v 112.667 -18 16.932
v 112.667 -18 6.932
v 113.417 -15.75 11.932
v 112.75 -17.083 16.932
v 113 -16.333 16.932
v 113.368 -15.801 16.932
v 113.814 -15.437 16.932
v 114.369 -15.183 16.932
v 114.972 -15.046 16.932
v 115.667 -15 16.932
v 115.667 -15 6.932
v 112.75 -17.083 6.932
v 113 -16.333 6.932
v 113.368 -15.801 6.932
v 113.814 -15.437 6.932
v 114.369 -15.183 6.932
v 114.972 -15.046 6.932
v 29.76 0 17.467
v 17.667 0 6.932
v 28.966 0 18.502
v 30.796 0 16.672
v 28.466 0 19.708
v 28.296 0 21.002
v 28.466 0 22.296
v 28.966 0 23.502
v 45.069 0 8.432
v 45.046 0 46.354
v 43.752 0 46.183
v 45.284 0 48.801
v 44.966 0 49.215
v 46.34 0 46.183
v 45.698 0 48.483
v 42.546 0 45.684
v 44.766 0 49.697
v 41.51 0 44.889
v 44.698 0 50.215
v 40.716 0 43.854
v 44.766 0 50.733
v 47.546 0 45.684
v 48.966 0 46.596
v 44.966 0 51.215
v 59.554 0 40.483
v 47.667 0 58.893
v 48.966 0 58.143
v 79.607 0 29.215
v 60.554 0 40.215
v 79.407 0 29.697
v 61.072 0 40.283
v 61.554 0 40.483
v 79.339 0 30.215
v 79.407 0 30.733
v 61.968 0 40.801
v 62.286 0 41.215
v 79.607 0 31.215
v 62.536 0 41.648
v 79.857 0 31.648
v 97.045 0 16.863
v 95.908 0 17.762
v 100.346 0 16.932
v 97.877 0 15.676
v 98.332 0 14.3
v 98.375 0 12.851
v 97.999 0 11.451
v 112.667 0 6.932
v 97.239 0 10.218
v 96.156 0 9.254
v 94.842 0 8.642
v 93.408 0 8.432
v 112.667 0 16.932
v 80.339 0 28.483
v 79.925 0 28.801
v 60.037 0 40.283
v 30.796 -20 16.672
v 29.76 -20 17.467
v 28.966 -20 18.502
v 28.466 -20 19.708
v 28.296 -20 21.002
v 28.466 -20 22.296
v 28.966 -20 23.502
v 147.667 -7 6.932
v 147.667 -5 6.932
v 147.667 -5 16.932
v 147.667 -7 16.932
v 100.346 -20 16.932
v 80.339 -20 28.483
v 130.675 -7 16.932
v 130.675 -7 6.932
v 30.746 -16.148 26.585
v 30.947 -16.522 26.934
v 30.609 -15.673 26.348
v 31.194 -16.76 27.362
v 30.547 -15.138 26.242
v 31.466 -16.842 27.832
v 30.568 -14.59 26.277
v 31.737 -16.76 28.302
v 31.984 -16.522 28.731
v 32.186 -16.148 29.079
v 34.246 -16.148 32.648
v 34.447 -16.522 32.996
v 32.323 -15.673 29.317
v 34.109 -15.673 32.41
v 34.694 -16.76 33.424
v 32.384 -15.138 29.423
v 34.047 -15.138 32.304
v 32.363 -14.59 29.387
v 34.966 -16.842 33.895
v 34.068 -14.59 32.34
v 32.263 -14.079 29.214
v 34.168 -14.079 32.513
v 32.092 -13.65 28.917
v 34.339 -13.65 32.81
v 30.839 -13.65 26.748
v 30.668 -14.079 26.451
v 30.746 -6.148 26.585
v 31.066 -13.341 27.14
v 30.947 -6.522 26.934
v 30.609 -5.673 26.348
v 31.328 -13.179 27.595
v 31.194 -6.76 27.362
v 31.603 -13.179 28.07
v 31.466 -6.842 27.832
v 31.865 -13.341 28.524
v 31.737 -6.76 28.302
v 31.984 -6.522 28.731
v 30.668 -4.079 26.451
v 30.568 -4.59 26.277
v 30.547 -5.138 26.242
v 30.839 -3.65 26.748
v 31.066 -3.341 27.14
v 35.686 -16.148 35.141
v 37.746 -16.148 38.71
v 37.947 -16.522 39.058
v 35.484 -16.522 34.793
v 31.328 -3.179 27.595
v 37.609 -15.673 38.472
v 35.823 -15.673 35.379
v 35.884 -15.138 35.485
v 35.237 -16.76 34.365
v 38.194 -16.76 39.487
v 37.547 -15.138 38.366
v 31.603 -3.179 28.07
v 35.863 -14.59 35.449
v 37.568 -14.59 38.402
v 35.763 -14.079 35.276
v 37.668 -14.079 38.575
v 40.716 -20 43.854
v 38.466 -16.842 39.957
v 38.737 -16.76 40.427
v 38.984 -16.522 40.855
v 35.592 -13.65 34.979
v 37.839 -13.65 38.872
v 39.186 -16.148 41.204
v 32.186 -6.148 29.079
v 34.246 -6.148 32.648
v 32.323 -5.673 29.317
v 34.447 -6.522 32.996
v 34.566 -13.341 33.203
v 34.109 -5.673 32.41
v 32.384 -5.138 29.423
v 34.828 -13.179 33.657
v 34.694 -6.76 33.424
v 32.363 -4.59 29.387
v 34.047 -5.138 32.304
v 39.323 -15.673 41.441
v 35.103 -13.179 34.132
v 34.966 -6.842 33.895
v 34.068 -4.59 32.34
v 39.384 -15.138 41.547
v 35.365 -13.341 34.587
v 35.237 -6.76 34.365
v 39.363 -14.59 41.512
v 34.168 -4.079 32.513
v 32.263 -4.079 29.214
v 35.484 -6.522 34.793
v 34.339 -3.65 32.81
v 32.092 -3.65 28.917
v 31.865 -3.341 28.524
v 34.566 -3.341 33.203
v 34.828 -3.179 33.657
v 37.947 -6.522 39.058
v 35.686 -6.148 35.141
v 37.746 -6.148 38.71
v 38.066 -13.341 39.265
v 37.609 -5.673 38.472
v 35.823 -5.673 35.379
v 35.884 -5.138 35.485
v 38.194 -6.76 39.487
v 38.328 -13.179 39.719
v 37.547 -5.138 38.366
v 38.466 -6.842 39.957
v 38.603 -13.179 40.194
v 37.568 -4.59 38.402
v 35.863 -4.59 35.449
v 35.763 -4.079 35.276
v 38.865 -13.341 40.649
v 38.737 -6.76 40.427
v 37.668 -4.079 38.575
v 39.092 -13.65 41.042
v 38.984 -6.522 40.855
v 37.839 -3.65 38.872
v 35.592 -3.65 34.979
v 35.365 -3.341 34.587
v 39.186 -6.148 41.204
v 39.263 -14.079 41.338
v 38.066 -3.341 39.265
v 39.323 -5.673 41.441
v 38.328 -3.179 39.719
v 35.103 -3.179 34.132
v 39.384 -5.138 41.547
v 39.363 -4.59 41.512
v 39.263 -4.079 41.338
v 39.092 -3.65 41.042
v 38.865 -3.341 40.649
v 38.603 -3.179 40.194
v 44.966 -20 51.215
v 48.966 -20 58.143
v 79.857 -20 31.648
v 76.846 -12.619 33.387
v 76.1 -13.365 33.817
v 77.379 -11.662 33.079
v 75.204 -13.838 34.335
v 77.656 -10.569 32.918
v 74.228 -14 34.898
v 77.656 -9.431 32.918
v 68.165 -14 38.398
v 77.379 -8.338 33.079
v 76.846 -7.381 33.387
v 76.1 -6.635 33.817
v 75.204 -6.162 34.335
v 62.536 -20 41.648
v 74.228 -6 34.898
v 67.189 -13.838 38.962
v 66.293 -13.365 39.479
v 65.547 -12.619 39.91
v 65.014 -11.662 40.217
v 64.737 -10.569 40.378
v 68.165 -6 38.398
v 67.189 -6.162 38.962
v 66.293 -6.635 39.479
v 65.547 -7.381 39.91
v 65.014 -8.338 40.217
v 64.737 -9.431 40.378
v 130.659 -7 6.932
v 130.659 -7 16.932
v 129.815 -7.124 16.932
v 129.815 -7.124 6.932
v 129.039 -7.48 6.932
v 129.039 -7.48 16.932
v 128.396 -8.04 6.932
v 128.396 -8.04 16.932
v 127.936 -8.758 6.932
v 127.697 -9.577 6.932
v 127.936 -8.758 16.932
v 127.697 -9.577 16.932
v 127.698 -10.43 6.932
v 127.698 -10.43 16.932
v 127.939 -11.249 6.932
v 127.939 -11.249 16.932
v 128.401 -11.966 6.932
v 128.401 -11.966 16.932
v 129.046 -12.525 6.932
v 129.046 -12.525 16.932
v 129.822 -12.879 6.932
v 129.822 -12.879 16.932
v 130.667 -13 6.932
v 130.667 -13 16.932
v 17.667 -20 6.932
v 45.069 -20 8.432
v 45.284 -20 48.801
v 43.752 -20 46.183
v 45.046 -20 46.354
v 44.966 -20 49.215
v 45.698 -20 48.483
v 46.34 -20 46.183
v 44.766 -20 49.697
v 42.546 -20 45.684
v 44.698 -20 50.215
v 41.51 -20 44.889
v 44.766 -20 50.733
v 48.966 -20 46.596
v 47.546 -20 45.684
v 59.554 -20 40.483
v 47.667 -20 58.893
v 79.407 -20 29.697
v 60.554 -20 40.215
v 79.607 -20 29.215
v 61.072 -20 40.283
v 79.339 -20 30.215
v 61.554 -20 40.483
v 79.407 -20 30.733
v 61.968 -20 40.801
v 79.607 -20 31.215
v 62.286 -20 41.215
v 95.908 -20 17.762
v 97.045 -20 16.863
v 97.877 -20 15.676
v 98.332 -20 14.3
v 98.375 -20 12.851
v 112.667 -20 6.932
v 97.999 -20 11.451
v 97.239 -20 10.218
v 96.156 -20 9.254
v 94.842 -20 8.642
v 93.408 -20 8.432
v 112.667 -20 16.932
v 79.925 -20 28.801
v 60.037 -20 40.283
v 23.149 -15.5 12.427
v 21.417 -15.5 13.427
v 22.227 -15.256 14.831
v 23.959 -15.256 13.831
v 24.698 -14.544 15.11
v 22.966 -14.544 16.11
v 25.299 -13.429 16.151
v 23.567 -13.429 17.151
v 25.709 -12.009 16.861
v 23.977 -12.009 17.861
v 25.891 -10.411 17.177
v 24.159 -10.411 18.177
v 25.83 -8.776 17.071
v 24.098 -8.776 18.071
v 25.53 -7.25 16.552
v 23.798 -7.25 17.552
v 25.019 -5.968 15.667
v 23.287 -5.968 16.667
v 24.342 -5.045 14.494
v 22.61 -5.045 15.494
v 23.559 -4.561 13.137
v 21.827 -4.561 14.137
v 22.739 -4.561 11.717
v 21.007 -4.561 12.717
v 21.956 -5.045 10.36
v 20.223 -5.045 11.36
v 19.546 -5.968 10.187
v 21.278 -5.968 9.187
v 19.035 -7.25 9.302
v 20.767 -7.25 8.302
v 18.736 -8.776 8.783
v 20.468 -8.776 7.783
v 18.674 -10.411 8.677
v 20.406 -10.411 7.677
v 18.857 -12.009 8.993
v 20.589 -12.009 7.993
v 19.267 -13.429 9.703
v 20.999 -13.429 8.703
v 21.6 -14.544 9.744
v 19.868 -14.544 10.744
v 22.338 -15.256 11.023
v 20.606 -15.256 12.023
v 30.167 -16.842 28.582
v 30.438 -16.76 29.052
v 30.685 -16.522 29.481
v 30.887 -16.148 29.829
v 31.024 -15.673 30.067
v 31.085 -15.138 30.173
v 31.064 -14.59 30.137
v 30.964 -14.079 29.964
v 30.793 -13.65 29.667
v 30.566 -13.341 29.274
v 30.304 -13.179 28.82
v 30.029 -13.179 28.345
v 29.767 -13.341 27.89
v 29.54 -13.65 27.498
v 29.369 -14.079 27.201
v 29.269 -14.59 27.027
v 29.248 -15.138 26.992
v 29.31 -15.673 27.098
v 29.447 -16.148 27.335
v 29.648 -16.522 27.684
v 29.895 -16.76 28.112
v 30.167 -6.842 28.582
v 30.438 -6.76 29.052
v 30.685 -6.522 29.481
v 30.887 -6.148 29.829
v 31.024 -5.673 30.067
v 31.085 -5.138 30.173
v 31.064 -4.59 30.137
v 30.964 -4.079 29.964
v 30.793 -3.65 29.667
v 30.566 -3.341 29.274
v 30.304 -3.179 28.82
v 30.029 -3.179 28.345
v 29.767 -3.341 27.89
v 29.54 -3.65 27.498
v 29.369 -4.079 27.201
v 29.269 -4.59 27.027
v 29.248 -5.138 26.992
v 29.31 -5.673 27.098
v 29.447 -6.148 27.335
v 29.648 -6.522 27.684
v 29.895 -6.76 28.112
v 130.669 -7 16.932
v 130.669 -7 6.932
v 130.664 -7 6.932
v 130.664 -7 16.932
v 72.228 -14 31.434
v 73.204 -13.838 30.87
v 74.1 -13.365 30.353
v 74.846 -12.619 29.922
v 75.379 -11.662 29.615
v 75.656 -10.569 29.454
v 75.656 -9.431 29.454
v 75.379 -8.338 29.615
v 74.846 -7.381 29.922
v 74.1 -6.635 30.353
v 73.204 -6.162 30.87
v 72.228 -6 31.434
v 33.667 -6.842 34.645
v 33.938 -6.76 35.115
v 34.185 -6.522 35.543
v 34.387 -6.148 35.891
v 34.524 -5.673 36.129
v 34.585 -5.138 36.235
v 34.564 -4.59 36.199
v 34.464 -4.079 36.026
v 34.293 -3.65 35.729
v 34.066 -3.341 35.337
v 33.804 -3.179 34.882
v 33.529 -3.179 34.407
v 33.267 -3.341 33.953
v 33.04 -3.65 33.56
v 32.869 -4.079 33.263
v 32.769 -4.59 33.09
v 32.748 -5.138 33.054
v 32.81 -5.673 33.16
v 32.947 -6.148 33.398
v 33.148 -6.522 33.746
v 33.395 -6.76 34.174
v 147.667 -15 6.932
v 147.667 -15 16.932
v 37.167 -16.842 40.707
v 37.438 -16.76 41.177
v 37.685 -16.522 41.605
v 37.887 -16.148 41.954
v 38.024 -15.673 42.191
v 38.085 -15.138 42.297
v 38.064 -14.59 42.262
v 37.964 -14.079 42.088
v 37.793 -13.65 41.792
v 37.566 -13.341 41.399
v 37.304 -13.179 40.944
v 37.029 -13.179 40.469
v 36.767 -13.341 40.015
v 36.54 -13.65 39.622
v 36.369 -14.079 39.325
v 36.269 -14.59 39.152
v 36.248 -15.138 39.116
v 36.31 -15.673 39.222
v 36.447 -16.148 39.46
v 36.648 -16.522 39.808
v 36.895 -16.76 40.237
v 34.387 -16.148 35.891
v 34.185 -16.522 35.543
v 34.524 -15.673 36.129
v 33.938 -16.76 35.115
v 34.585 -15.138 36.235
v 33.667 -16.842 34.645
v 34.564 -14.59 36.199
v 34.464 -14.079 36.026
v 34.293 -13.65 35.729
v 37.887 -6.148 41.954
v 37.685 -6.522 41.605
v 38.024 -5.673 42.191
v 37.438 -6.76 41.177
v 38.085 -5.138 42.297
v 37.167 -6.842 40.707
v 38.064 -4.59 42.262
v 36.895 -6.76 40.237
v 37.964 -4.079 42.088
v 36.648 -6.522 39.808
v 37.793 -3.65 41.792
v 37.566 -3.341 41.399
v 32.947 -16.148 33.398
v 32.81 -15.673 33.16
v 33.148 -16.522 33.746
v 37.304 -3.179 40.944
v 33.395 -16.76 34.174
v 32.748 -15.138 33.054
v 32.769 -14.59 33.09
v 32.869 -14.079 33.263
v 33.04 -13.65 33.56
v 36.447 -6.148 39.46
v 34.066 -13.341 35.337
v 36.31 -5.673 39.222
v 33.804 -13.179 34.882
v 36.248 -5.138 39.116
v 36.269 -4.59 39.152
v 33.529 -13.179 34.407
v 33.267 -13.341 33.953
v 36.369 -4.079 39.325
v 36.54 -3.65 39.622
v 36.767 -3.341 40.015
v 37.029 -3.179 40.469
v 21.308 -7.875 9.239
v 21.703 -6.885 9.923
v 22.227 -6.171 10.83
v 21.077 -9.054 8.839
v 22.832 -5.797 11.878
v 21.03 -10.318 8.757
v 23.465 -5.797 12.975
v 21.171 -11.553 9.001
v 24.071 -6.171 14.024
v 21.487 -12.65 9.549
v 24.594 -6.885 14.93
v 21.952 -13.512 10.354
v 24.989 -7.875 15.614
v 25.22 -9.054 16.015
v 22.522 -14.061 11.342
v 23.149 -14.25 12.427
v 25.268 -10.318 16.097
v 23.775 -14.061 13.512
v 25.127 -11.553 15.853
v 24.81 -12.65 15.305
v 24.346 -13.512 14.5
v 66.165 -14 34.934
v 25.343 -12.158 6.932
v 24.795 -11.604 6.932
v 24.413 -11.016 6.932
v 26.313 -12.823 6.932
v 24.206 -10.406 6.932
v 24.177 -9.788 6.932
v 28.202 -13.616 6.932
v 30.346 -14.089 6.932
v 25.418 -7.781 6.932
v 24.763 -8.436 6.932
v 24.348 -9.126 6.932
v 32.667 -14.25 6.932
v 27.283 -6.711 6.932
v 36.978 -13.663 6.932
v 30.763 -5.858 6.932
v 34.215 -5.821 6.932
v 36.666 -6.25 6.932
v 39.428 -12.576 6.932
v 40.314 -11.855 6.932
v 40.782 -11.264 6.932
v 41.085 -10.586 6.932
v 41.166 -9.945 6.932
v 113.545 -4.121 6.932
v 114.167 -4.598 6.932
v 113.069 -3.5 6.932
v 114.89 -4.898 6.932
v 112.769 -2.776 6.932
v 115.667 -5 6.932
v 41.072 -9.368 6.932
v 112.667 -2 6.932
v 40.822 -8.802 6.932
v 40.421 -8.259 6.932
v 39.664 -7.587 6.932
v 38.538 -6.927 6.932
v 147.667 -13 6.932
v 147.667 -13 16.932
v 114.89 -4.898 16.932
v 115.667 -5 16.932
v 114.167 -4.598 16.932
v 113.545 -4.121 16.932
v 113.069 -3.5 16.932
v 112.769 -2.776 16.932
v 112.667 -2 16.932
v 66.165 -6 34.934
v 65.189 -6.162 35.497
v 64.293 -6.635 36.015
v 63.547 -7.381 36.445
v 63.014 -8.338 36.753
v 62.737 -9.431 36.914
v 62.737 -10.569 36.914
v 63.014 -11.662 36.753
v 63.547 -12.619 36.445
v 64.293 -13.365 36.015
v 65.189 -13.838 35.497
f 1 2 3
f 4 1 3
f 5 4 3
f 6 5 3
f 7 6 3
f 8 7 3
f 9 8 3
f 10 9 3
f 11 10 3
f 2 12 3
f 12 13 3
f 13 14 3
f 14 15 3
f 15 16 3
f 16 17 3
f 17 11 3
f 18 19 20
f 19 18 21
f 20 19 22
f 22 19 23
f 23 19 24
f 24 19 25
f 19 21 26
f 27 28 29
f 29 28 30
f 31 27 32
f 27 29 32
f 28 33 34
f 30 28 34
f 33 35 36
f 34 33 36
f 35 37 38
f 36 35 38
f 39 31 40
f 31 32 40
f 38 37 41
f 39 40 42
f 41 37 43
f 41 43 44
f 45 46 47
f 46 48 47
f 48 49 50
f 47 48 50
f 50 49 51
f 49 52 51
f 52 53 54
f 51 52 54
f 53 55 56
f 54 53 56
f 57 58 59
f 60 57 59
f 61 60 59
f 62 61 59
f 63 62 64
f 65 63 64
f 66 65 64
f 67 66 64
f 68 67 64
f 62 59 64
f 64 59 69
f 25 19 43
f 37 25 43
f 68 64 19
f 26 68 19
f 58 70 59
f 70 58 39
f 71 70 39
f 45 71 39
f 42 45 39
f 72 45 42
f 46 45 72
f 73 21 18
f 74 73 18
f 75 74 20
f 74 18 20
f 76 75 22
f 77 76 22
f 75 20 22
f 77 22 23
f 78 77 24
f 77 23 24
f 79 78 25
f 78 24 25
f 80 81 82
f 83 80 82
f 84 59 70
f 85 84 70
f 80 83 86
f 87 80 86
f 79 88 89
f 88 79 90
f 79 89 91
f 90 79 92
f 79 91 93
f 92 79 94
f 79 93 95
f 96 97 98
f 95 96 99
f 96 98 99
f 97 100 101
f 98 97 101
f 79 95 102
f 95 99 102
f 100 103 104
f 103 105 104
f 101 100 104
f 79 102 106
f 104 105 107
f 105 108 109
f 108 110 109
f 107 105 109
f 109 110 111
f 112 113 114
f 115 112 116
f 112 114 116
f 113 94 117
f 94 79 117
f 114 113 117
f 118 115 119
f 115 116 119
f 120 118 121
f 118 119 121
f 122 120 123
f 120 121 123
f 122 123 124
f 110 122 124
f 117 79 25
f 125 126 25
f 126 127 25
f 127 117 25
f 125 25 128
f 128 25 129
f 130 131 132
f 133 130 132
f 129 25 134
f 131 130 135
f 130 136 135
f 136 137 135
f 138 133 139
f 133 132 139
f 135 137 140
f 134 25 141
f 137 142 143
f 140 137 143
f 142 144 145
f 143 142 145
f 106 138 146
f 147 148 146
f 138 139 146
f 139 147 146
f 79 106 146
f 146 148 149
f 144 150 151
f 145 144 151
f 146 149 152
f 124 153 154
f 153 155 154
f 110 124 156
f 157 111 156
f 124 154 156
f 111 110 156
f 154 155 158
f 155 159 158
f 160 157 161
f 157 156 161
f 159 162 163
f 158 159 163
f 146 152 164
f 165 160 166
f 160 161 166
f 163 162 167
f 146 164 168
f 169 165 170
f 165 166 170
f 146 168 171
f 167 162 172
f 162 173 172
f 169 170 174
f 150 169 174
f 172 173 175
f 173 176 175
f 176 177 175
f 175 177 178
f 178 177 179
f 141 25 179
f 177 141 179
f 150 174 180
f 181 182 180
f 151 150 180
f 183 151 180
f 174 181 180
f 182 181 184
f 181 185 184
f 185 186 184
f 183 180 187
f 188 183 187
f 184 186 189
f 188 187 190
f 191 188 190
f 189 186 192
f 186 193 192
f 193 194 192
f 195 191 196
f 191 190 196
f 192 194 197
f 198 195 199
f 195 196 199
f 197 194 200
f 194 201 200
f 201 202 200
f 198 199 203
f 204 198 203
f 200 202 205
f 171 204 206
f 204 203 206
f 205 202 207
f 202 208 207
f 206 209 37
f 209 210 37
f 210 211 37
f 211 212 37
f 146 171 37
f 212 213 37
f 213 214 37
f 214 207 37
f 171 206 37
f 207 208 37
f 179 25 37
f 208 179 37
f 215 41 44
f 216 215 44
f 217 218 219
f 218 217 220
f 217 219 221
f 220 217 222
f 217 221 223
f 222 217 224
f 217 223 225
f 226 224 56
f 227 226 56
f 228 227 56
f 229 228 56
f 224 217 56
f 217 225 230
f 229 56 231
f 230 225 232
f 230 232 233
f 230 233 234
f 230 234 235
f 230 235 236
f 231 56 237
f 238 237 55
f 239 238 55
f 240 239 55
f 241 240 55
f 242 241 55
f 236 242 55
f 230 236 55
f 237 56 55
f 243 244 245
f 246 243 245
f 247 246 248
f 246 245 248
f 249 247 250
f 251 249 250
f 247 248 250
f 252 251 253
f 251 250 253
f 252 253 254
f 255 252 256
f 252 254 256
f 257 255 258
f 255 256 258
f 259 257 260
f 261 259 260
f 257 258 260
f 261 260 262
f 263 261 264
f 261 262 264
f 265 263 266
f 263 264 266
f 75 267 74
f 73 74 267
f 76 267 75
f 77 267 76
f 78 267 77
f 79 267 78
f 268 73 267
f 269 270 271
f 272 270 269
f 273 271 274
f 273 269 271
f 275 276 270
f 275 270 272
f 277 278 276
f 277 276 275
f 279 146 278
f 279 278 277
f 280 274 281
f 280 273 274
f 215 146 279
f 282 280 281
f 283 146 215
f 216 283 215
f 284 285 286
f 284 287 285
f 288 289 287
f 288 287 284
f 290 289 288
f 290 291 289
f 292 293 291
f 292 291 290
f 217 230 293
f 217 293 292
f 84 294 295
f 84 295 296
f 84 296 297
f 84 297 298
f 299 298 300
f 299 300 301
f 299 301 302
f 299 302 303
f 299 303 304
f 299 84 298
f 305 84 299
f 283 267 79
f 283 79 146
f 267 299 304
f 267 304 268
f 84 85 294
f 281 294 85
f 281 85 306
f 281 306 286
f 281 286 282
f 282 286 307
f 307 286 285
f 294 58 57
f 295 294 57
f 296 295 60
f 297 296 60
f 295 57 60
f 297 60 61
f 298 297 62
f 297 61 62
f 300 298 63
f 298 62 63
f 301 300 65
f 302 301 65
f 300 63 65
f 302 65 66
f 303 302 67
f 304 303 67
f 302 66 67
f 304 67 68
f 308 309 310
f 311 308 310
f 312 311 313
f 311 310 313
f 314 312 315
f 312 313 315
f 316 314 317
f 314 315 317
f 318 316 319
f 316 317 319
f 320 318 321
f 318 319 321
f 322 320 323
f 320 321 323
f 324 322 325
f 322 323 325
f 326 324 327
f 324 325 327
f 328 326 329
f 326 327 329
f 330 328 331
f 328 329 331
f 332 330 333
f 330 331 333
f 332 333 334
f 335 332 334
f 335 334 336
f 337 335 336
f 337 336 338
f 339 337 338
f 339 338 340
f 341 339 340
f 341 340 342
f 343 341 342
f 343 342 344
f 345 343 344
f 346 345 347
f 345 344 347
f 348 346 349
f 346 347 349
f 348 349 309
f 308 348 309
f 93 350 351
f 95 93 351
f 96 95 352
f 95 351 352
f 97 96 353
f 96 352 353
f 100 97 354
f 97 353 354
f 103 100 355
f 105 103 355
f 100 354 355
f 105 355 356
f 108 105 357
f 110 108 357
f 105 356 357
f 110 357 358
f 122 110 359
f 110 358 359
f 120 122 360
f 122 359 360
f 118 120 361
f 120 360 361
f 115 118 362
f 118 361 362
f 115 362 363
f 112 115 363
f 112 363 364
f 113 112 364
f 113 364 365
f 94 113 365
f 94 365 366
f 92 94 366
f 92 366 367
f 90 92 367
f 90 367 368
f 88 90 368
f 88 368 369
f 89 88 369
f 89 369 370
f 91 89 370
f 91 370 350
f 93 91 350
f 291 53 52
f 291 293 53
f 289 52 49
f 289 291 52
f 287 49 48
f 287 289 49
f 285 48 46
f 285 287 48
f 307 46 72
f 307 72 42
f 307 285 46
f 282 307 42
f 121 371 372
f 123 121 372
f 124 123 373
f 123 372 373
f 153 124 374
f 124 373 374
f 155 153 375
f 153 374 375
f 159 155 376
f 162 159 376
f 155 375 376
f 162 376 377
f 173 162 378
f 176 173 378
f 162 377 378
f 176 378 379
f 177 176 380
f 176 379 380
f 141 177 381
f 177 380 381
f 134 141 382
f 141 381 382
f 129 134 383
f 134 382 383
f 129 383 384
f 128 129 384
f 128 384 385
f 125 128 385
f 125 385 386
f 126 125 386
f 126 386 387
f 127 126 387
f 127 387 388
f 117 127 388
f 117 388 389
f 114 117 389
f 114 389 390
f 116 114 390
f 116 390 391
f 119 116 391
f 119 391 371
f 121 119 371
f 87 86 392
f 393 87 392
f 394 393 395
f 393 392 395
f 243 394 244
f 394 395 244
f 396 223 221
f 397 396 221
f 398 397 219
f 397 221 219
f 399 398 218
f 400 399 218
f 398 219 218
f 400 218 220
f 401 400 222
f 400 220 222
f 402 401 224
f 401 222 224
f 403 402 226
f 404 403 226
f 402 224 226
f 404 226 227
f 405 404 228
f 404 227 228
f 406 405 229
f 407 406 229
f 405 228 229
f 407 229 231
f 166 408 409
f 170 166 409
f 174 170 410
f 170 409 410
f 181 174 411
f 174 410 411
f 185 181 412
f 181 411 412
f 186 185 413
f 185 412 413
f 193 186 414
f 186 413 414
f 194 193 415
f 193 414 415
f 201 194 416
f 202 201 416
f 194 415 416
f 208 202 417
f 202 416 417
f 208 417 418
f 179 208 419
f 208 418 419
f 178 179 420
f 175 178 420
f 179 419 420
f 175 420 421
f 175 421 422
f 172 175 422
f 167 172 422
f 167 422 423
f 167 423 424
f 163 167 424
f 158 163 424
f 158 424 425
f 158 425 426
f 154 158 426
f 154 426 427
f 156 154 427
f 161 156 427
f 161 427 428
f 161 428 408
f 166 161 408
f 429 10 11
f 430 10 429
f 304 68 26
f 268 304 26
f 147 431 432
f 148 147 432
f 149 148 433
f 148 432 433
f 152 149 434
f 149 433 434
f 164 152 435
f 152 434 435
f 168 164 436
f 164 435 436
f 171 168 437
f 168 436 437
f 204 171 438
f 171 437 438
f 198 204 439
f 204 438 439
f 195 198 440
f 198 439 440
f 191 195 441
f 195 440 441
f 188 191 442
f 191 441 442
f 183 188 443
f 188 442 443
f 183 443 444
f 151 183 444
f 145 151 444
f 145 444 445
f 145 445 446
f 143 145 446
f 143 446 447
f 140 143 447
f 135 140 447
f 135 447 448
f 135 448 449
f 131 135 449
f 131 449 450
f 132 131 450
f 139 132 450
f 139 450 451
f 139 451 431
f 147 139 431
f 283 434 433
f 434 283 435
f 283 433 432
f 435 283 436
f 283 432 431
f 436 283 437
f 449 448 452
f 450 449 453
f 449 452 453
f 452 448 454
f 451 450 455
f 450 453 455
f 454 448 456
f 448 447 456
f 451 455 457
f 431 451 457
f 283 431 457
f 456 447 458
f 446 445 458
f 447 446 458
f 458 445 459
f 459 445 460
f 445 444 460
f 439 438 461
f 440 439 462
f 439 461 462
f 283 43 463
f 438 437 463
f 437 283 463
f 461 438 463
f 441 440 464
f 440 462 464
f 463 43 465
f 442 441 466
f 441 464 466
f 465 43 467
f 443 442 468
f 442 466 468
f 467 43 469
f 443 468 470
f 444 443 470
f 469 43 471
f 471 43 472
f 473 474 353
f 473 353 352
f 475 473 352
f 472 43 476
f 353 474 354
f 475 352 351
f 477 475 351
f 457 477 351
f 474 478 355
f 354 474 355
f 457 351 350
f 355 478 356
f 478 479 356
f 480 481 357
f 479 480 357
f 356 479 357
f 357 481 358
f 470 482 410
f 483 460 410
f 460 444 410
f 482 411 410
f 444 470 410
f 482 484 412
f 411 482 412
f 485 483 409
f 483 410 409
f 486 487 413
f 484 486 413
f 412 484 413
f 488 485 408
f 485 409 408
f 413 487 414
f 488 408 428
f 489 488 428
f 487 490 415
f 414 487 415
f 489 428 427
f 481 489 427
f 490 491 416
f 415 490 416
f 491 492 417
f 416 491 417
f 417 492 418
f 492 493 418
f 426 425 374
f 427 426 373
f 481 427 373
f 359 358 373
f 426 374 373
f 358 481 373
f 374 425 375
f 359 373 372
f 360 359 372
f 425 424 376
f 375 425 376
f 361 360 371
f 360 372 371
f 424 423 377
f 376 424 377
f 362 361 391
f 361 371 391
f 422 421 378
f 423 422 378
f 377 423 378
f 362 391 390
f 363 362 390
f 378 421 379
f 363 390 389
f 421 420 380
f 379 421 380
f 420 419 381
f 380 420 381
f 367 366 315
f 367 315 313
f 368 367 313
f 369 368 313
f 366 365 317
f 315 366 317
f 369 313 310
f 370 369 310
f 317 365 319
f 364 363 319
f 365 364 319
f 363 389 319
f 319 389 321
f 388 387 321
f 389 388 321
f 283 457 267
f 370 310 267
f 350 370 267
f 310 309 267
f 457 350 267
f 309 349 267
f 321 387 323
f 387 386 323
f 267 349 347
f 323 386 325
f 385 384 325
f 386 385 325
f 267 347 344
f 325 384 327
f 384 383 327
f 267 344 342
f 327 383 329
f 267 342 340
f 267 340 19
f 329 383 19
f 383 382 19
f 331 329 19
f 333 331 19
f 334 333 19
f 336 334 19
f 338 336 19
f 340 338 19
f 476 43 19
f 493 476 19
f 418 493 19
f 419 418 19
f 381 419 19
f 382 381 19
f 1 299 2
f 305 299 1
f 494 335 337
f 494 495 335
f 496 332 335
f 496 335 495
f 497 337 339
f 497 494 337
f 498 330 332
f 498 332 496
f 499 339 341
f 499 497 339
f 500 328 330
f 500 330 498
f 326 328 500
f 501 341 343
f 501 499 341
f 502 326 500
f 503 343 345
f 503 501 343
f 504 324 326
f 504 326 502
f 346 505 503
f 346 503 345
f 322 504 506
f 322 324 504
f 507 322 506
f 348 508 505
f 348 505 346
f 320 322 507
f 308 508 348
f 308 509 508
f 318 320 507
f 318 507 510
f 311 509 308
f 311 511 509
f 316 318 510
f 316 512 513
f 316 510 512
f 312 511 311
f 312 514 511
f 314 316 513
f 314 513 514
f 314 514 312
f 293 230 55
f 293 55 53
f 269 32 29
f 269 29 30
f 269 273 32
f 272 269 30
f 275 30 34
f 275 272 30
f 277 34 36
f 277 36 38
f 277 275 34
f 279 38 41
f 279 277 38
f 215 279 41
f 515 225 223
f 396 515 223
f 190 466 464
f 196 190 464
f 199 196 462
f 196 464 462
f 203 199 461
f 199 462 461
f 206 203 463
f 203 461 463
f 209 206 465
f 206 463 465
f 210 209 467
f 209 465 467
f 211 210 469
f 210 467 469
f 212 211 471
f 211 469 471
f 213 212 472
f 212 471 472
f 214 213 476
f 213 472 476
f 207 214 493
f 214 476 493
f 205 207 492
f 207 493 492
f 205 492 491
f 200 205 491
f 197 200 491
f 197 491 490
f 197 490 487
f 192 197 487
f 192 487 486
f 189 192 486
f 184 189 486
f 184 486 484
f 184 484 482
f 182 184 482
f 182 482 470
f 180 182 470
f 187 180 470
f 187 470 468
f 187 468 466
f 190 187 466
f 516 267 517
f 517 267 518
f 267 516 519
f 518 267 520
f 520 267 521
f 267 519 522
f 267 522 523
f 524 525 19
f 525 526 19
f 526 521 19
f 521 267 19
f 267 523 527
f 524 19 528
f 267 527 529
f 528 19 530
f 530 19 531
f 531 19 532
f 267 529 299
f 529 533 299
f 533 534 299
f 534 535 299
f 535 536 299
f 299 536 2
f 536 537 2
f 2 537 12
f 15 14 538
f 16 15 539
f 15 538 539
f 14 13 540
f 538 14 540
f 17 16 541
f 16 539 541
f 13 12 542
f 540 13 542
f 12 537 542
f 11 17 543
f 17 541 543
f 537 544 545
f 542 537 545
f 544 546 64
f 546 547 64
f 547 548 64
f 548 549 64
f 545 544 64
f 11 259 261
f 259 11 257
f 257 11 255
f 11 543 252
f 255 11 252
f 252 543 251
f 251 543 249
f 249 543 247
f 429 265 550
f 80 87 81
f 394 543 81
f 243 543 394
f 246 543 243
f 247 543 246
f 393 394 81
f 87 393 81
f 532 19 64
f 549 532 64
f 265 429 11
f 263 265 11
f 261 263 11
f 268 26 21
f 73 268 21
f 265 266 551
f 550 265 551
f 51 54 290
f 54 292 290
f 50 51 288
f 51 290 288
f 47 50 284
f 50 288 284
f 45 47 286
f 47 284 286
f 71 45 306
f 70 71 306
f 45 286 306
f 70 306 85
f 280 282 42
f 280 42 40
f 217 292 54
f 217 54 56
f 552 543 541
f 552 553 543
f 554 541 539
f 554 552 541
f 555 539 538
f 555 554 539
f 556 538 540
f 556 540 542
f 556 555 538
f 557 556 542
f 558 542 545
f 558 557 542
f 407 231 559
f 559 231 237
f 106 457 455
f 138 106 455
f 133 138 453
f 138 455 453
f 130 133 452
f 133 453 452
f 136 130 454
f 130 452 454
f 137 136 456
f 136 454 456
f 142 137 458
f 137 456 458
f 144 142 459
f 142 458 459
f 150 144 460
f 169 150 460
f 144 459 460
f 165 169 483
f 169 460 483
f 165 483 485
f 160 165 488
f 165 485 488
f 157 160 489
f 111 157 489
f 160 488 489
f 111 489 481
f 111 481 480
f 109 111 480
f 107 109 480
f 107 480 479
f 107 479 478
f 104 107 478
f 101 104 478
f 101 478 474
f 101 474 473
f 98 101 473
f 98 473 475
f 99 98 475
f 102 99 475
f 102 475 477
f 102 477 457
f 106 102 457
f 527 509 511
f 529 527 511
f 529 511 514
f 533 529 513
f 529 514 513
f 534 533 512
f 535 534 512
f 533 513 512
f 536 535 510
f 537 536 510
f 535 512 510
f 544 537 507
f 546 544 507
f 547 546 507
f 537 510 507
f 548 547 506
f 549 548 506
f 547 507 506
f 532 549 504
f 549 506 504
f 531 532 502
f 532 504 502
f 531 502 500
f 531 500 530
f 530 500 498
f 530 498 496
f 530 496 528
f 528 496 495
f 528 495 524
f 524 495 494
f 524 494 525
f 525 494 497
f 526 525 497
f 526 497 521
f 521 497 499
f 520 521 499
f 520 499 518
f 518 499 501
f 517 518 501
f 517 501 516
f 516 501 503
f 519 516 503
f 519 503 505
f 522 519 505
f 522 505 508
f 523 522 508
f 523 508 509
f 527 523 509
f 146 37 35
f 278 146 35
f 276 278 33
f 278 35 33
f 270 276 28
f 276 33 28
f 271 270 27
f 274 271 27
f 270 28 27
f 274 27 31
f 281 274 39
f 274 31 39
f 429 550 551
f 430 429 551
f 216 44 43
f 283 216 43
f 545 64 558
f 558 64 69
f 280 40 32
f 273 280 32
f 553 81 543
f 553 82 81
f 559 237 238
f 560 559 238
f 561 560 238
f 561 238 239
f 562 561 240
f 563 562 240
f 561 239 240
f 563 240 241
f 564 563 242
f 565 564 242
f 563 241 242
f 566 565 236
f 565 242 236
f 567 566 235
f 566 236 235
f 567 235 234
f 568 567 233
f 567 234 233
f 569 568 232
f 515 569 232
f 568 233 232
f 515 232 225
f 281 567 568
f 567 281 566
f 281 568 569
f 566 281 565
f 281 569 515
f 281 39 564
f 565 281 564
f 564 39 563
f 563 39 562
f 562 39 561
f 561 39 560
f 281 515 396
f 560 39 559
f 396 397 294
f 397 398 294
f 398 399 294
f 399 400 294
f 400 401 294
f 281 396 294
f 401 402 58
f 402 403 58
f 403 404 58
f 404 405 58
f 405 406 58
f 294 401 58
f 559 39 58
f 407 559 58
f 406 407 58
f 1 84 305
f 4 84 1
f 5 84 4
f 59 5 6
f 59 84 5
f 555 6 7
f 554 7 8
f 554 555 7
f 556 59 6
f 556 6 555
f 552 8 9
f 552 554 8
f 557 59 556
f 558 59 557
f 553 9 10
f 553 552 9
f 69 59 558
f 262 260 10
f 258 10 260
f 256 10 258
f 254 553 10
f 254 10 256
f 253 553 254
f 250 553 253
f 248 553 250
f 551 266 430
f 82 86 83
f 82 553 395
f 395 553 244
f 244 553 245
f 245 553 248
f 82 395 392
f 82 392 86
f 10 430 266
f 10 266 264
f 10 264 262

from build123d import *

# Parameters (mm, degrees)
F1_DEPTH    = 20
F2_W        = 35
F2_H        = 10
F3_DEPTH    = 5
F4_W        = 35
F4_H        = 10
F5_DEPTH    = 5
F7_DEPTH    = 25
F8_T1_DEPTH = 10
F9_R        = 3
F10_R       = 2
F11_R       = 2
F12_R       = 2
F14_DEPTH   = 15
F15_R       = 5.5
F16_DEPTH   = 2
F17_R       = 4.25
F18_DEPTH   = 110.5843026286
F19_R       = 1.8416313508
F20_DEPTH   = 10


# Not quite as in the source:
# - a fillet or chamfer that OpenCascade refuses, or shapes differently, is made with other operations: its cross-section is extruded or revolved along the edge and cut away or added


with BuildPart() as f1:
    # F0 (on Front) → F1 (new body)
    with BuildSketch(Plane.XZ):
        Polygon((48.965709947, 58.1432288134), (47.6666718414, 58.8932288134), (17.6666718414, 6.9317045863), (147.6666718414, 6.9317045863), (147.6666718414, 16.9317045863), (100.3461637657, 16.9317045863), (78.6067260984, 29.4829747755), (79.8567260984, 31.648038285), (62.5362180227, 41.648038285), (61.2862180227, 39.4829747755), (48.965709947, 46.5962234296), (43.965709947, 49.4829747755), align=None)
        with BuildLine():
            Line((45.06859563, 8.4317045863), (30.795836966, 16.6720856431))
            ThreePointArc((30.795836966, 16.6720856431), (28.4662078345, 19.7081174365), (28.965709947, 23.502212662))
            Line((28.965709947, 23.502212662), (40.715709947, 43.8538096509))
            ThreePointArc((40.715709947, 43.8538096509), (43.7517417405, 46.1834387824), (47.545836966, 45.6839366698))
            Line((47.545836966, 45.6839366698), (95.9083415922, 17.7618316052))
            ThreePointArc((95.9083415922, 17.7618316052), (98.2379707236, 12.1376093608), (93.4083415922, 8.4317045863))
            Line((93.4083415922, 8.4317045863), (45.06859563, 8.4317045863))
        make_face(mode=Mode.SUBTRACT)
    extrude(amount=F1_DEPTH)

    # F2 (on face) → F3 (cut)
    with BuildSketch(Plane.XZ.offset(20)):
        with Locations((130.1666718414, 11.9317045863)):
            Rectangle(F2_W, F2_H)
    extrude(amount=-F3_DEPTH, mode=Mode.SUBTRACT)

    # F4 (on face) → F5 (cut)
    with BuildSketch(Plane(origin=(0, 0, 0), x_dir=(-1, 0, 0), z_dir=(0, 1, 0))):
        with Locations((-130.1666718414, 11.9317045863)):
            Rectangle(F4_W, F4_H)
    extrude(amount=-F5_DEPTH, mode=Mode.SUBTRACT)

    # F6 (on face) → F7 (cut)
    with BuildSketch(Plane.XY.offset(16.9317045863)):
        with BuildLine():
            Line((147.6666718414, -7.0000102813), (130.6745260024, -7.0000102813))
            ThreePointArc((130.6745260024, -7.0000102813), (130.6666718414, -7), (130.6588176804, -7.0000102813))
            ThreePointArc((130.6588176804, -7.0000102813), (127.6666744117, -10.0039270839), (130.6666718414, -13))
            Line((130.6666718414, -13), (147.6666718414, -13))
            Line((147.6666718414, -13), (147.6666718414, -7.0000102813))
        make_face()
    extrude(amount=-F7_DEPTH, mode=Mode.SUBTRACT)

    # F8: fillet of radius 3 on 1 edges, made by hand

    # F8_s2 → F8_t1 (join)
    with BuildSketch(Plane.XY.offset(6.9317045863)):
        with BuildLine():
            add(Edge.make_bspline(
                [(112.6666718414, -18), (112.6666718414, -15), (115.6666718414, -15)],
                knots=[0, 0, 0, 1, 1, 1], degree=2, weights=[1, 1, 1]))
            Line((115.6666718414, -15), (112.6666718414, -15))
            Line((112.6666718414, -15), (112.6666718414, -18))
        make_face()
    extrude(amount=F8_T1_DEPTH)

    # F9
    f9_edges = [f1.edges().sort_by_distance(p)[0] for p in [
        (112.666672, -5, 11.931705),
    ]]
    fillet(f9_edges, radius=F9_R)

    # F10
    f10_edges = [f1.edges().sort_by_distance(p)[0] for p in [
        (78.606726, -10, 29.482975),
    ]]
    fillet(f10_edges, radius=F10_R)

    # F11
    f11_edges = [f1.edges().sort_by_distance(p)[0] for p in [
        (61.286218, -10, 39.482975),
    ]]
    fillet(f11_edges, radius=F11_R)

    # F12
    f12_edges = [f1.edges().sort_by_distance(p)[0] for p in [
        (43.96571, -10, 49.482975),
    ]]
    fillet(f12_edges, radius=F12_R)

    # F13 (on face) → F14 (cut)
    with BuildSketch(Plane(origin=(33.668184092, 0, 58.3150054459), x_dir=(0.8660254038, 0, -0.5), z_dir=(0.5, 0, 0.8660254038))):
        with BuildLine():
            Line((46.8339343218, -6), (39.8339343218, -6))
            ThreePointArc((39.8339343218, -6), (35.8339343218, -10), (39.8339343218, -14))
            Line((39.8339343218, -14), (46.8339343218, -14))
            ThreePointArc((46.8339343218, -14), (50.8339343218, -10), (46.8339343218, -6))
        make_face()
    extrude(amount=-F14_DEPTH, mode=Mode.SUBTRACT)

    # F15 (on face) → F16 (cut)
    with BuildSketch(Plane(origin=(10.2484877494, 0, -5.9169671609), x_dir=(0, -1, 0), z_dir=(-0.8660254038, 0, 0.5))):
        with Locations((10, 22.3363681839)):
            Circle(F15_R)
    extrude(amount=-F16_DEPTH, mode=Mode.SUBTRACT)

    # F17 (on face) → F18 (cut, through all)
    with BuildSketch(Plane(origin=(11.980538557, 0, -6.9169671609), x_dir=(0, -1, 0), z_dir=(-0.8660254038, 0, 0.5))):
        with Locations((10, 22.3363681839)):
            Circle(F17_R)
    extrude(amount=-F18_DEPTH, mode=Mode.SUBTRACT)

    # F19 (on face) → F20 (cut)
    with BuildSketch(Plane(origin=(10.2484877494, 0, -5.9169671609), x_dir=(0, -1, 0), z_dir=(-0.8660254038, 0, 0.5))):
        with Locations((15, 53.8363681839)):
            Circle(F19_R)
        with Locations((5, 53.8363681839)):
            Circle(F19_R)
        with Locations((5, 46.8363681839)):
            Circle(F19_R)
        with Locations((15, 46.8363681839)):
            Circle(F19_R)
        with Locations((15, 39.8363681839)):
            Circle(F19_R)
        with Locations((5, 39.8363681839)):
            Circle(F19_R)
    extrude(amount=-F20_DEPTH, mode=Mode.SUBTRACT)


solid = f1.part
